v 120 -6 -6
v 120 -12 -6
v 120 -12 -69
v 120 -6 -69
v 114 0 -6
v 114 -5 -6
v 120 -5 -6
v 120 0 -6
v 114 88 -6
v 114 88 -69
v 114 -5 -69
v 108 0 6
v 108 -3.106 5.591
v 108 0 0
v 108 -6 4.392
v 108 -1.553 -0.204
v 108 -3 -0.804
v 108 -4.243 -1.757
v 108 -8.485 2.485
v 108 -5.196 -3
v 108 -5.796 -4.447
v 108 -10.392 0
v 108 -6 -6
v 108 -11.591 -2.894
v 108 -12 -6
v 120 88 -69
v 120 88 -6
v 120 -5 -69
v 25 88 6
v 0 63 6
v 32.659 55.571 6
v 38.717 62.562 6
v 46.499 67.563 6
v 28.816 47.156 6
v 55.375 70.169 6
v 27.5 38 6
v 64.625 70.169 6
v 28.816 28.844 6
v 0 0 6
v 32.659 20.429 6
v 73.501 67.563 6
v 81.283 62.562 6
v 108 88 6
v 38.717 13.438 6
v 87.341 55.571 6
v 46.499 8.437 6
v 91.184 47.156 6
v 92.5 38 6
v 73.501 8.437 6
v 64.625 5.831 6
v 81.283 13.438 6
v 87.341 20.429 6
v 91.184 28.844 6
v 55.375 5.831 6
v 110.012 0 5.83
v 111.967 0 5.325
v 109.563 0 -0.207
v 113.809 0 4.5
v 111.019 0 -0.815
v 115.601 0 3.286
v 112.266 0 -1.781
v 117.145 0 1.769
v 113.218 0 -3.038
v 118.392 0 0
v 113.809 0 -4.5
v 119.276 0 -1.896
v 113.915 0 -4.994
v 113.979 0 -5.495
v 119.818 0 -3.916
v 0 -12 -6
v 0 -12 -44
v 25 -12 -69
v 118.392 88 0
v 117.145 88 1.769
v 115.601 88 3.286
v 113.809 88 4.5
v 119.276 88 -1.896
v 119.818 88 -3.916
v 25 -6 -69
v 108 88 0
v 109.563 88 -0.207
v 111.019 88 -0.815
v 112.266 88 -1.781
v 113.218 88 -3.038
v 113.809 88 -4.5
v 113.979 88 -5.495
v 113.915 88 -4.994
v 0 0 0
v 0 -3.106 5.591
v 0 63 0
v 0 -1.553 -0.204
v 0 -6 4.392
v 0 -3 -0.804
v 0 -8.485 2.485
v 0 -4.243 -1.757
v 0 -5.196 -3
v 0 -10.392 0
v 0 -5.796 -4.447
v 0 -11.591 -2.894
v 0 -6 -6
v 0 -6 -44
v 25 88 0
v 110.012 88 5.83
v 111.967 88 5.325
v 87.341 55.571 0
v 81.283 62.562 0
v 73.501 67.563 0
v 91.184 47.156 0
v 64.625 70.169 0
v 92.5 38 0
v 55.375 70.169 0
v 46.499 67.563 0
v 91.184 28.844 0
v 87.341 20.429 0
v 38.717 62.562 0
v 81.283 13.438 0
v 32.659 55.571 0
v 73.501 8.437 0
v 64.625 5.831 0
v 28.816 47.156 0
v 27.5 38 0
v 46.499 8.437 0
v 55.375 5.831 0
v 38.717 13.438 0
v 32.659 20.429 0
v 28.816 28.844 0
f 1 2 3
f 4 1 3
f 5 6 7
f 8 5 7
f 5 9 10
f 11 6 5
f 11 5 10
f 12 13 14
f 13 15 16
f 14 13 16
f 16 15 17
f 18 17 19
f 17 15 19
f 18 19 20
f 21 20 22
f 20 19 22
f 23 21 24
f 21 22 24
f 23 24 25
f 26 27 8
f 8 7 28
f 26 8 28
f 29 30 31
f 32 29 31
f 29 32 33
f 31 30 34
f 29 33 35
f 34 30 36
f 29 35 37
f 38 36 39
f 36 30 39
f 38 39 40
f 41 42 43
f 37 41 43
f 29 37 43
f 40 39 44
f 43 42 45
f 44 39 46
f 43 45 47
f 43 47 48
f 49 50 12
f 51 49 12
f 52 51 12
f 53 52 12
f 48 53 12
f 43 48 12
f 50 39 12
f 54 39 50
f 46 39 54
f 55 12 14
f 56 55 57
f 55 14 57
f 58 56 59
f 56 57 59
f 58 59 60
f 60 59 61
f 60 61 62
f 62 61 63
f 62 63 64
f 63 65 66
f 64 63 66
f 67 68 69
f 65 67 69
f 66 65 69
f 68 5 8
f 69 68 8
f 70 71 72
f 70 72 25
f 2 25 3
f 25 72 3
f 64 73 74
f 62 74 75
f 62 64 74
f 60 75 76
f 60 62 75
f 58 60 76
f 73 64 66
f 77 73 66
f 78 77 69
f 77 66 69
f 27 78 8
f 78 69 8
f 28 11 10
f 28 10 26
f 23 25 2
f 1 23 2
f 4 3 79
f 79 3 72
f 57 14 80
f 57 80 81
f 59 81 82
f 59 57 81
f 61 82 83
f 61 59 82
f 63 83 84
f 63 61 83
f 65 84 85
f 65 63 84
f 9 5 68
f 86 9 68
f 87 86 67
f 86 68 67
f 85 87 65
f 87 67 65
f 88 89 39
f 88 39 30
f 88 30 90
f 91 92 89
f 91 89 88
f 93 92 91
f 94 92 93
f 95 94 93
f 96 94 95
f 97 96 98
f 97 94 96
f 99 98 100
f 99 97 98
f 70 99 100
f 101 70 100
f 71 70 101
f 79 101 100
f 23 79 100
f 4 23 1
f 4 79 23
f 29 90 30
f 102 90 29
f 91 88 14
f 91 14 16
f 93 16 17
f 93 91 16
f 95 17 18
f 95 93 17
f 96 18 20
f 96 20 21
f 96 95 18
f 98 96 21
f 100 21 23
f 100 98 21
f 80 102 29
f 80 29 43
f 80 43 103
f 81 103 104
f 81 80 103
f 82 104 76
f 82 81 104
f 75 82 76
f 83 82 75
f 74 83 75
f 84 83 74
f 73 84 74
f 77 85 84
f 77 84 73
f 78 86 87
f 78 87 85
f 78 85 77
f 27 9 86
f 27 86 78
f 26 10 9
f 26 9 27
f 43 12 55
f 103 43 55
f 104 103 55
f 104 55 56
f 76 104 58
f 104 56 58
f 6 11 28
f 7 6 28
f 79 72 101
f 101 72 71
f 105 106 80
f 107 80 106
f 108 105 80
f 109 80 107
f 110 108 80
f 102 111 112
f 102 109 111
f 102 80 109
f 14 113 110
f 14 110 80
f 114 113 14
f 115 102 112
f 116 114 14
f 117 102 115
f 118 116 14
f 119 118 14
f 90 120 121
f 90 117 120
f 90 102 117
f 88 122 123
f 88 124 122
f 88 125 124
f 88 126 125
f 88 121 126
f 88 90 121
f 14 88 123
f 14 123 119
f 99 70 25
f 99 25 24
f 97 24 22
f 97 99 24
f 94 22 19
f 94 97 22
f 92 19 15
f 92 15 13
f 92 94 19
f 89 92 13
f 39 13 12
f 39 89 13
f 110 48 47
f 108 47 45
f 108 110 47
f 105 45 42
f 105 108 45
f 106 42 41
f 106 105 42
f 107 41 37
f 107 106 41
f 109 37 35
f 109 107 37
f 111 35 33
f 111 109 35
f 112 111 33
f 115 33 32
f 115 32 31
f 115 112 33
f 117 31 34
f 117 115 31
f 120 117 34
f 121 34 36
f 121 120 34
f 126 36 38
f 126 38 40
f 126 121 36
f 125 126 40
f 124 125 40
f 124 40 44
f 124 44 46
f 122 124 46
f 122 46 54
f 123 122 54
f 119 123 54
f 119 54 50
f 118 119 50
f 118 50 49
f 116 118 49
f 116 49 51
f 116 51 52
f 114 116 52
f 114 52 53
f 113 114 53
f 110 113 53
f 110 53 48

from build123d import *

# Parameters (mm, degrees)
SKETCH_1_W                       = 120
SKETCH_1_H                       = 88
SKETCH_1_R                       = 32.5
SM_BASE_FLANGE_1_DEPTH           = 6
SM_EDGE_FLANGE_5_STRIP_W         = 36
SM_EDGE_FLANGE_5_STRIP_H         = 6
SM_EDGE_FLANGE_5_STRIP_CUT_DEPTH = 88
SM_EDGE_FLANGE_5_DEPTH           = 88
SM_EDGE_FLANGE_7_DEPTH           = 108
OTHER_START                      = -12
OTHER_1_OUTLINE_W                = 12
OTHER_1_OUTLINE_H                = 63
OTHER_1_DEPTH                    = 6
OTHER_START_2                    = -5
OTHER_1_2_OUTLINE_W              = 6
OTHER_1_2_OUTLINE_H              = 63
OTHER_1_2_DEPTH                  = 5
CHAMFER_1_SIZE                   = 25
MOVE_START                       = -12
MOVE_BODY_1_DEPTH                = 100
MOVE_START_2                     = -5
MOVE_BODY_1_2_OUTLINE_W          = 108
MOVE_BODY_1_2_OUTLINE_H          = 12
MOVE_BODY_1_2_OUTLINE_W_2        = 6
MOVE_BODY_1_2_OUTLINE_H_2        = 63
MOVE_BODY_1_2_DEPTH              = 93
MOVE_BODY_1_3_DEPTH              = 6
MOVE_BODY_1_4_DEPTH              = 88
MOVE_START_3                     = -6
MOVE_BODY_1_5_OUTLINE_W          = 108
MOVE_BODY_1_5_OUTLINE_H          = 12
MOVE_BODY_1_5_DEPTH              = 1
MOVE_BODY_1_6_OUTLINE_R          = 32.5
MOVE_BODY_1_6_DEPTH              = 12
MOVE_BODY_1_7_DEPTH              = 108


with BuildPart() as part:
    # Базовая кромка1: sheet metal written as solids
    # Sketch 1 → Базовая кромка1 (new body)
    with BuildSketch(Plane.XY):
        with Locations((60, 44)):
            Rectangle(SKETCH_1_W, SKETCH_1_H)
        with Locations((60, 38)):
            Circle(SKETCH_1_R, mode=Mode.SUBTRACT)
    extrude(amount=-SM_BASE_FLANGE_1_DEPTH)

    # Ребро-кромка5: sheet metal written as solids
    # Ребро-кромка5 strip (on a plane across the edge) → Ребро-кромка5 strip cut (cut)
    with BuildSketch(Plane(origin=(120, 0, 0), x_dir=(-1, 0, 0), z_dir=(0, 1, 0))):
        with Locations((-6, -3)):
            Rectangle(SM_EDGE_FLANGE_5_STRIP_W, SM_EDGE_FLANGE_5_STRIP_H)
    extrude(amount=SM_EDGE_FLANGE_5_STRIP_CUT_DEPTH, mode=Mode.SUBTRACT)

    # Ребро-кромка5 section (on a plane across the edge) → Ребро-кромка5 (add)
    with BuildSketch(Plane(origin=(120, 0, 0), x_dir=(-1, 0, 0), z_dir=(0, 1, 0))):
        with BuildLine():
            Line((0, 6), (0, 69))
            Line((0, 69), (6, 69))
            Line((6, 69), (6, 6))
            ThreePointArc((6, 6), (7.757359313, 1.757359313), (12, 0))
            Line((12, 0), (12, -6))
            ThreePointArc((12, -6), (3.514718626, -2.485281374), (0, 6))
        make_face()
    extrude(amount=SM_EDGE_FLANGE_5_DEPTH)

    # Ребро-кромка7: sheet metal written as solids
    # Ребро-кромка7 section (on a plane across the edge) → Ребро-кромка7 (add)
    with BuildSketch(Plane(origin=(0, -6, 0), x_dir=(0, 1, 0), z_dir=(1, 0, 0))):
        with BuildLine():
            Line((-6, 6), (-6, 69))
            Line((-6, 69), (0, 69))
            Line((0, 69), (0, 6))
            ThreePointArc((0, 6), (1.757359313, 1.757359313), (6, 0))
            Line((6, 0), (6, -6))
            ThreePointArc((6, -6), (-2.485281374, -2.485281374), (-6, 6))
        make_face()
    extrude(amount=SM_EDGE_FLANGE_7_DEPTH)

    # Other 1: read off the stored shape, not the designer's step
    # Other 1 outline → Other 1 (add)
    with BuildSketch(Plane(origin=(0, 0, 0), x_dir=(1, 0, 0), z_dir=(0, 1, 0)).offset(OTHER_START)):
        with Locations((114, -37.5)):
            Rectangle(OTHER_1_OUTLINE_W, OTHER_1_OUTLINE_H)
    extrude(amount=OTHER_1_DEPTH)

    # Other 1 2 outline → Other 1 2 (add)
    with BuildSketch(Plane(origin=(0, 0, 0), x_dir=(1, 0, 0), z_dir=(0, 1, 0)).offset(OTHER_START_2)):
        with Locations((117, -37.5)):
            Rectangle(OTHER_1_2_OUTLINE_W, OTHER_1_2_OUTLINE_H)
    extrude(amount=OTHER_1_2_DEPTH)

    # Фаска1
    chamfer_1_edges = [part.edges().sort_by_distance(p)[0] for p in [
        (0, -9, 69),
        (0, 88, -3),
    ]]
    chamfer(chamfer_1_edges, length=CHAMFER_1_SIZE)

    # Move Body 1: read off the stored shape, not the designer's step
    # Move Body 1 outline → Move Body 1 (cut)
    with BuildSketch(Plane(origin=(0, 0, 0), x_dir=(1, 0, 0), z_dir=(0, 1, 0)).offset(MOVE_START)):
        with BuildLine():
            Line((0, -6), (0, -44))
            Line((0, -44), (25, -69))
            Line((25, -69), (120, -69))
            Line((120, -69), (120, -6))
            ThreePointArc((120, -6), (119.591109915, -2.894171459), (118.392304845, 0))
            ThreePointArc((118.392304845, 0), (116.40755123, -2.562305899), (113.809475019, -4.5))
            ThreePointArc((113.809475019, -4.5), (113.952178178, -5.243974245), (114, -6))
            Line((114, -6), (0, -6))
        make_face()
        with BuildLine():
            Line((108, 6), (108, 0))
            ThreePointArc((108, 0), (111.674234614, 1.25658351), (113.809475019, 4.5))
            ThreePointArc((113.809475019, 4.5), (111, 5.618950038), (108, 6))
        make_face()
    extrude(amount=MOVE_BODY_1_DEPTH, mode=Mode.SUBTRACT)

    # Move Body 1 2 outline → Move Body 1 2 (add)
    with BuildSketch(Plane(origin=(0, 0, 0), x_dir=(1, 0, 0), z_dir=(0, 1, 0)).offset(MOVE_START_2)):
        with Locations((54, 0)):
            Rectangle(MOVE_BODY_1_2_OUTLINE_W, MOVE_BODY_1_2_OUTLINE_H)
        with Locations((117, 37.5)):
            Rectangle(MOVE_BODY_1_2_OUTLINE_W_2, MOVE_BODY_1_2_OUTLINE_H_2)
    extrude(amount=MOVE_BODY_1_2_DEPTH)

    # Move Body 1 3 outline → Move Body 1 3 (add)
    with BuildSketch(Plane(origin=(0, 0, 0), x_dir=(1, 0, 0), z_dir=(0, 1, 0)).offset(MOVE_START)):
        Polygon((0, -6), (108, -6), (108, 6), (120, 6), (120, 69), (25, 69), (0, 44), align=None)
    extrude(amount=MOVE_BODY_1_3_DEPTH)

    # Move Body 1 4 outline → Move Body 1 4 (add)
    with BuildSketch(Plane(origin=(0, 0, 0), x_dir=(1, 0, 0), z_dir=(0, 1, 0))):
        with BuildLine():
            Line((108, 0), (108, -6))
            ThreePointArc((108, -6), (111, -5.618950038), (113.809475019, -4.5))
            ThreePointArc((113.809475019, -4.5), (111.674234614, -1.25658351), (108, 0))
        make_face()
        with BuildLine():
            ThreePointArc((113.809475019, 4.5), (116.40755123, 2.562305899), (118.392304845, 0))
            ThreePointArc((118.392304845, 0), (119.591109915, 2.894171459), (120, 6))
            Line((120, 6), (114, 6))
            ThreePointArc((114, 6), (113.952178178, 5.243974245), (113.809475019, 4.5))
        make_face()
    extrude(amount=MOVE_BODY_1_4_DEPTH)

    # Move Body 1 5 outline → Move Body 1 5 (add)
    with BuildSketch(Plane(origin=(0, 0, 0), x_dir=(1, 0, 0), z_dir=(0, 1, 0)).offset(MOVE_START_3)):
        with Locations((54, 0)):
            Rectangle(MOVE_BODY_1_5_OUTLINE_W, MOVE_BODY_1_5_OUTLINE_H)
    extrude(amount=MOVE_BODY_1_5_DEPTH)

    # Move Body 1 6 outline → Move Body 1 6 (cut)
    with BuildSketch(Plane.XY.offset(MOVE_START_3)):
        with Locations((60, 38)):
            Circle(MOVE_BODY_1_6_OUTLINE_R)
        Polygon((0, 88), (0, 63), (25, 88), align=None)
    extrude(amount=MOVE_BODY_1_6_DEPTH, mode=Mode.SUBTRACT)

    # Move Body 1 7 outline → Move Body 1 7 (cut)
    with BuildSketch(Plane.YZ):
        with BuildLine():
            Line((88, -6), (88, 0))
            Line((88, 0), (0, 0))
            ThreePointArc((0, 0), (-4.242640687, -1.757359313), (-6, -6))
            Line((-6, -6), (88, -6))
        make_face()
        with BuildLine():
            ThreePointArc((-12, -6), (-8.485281374, 2.485281374), (0, 6))
            Line((0, 6), (-12, 6))
            Line((-12, 6), (-12, -6))
        make_face()
    extrude(amount=MOVE_BODY_1_7_DEPTH, mode=Mode.SUBTRACT)


solid = part.part
